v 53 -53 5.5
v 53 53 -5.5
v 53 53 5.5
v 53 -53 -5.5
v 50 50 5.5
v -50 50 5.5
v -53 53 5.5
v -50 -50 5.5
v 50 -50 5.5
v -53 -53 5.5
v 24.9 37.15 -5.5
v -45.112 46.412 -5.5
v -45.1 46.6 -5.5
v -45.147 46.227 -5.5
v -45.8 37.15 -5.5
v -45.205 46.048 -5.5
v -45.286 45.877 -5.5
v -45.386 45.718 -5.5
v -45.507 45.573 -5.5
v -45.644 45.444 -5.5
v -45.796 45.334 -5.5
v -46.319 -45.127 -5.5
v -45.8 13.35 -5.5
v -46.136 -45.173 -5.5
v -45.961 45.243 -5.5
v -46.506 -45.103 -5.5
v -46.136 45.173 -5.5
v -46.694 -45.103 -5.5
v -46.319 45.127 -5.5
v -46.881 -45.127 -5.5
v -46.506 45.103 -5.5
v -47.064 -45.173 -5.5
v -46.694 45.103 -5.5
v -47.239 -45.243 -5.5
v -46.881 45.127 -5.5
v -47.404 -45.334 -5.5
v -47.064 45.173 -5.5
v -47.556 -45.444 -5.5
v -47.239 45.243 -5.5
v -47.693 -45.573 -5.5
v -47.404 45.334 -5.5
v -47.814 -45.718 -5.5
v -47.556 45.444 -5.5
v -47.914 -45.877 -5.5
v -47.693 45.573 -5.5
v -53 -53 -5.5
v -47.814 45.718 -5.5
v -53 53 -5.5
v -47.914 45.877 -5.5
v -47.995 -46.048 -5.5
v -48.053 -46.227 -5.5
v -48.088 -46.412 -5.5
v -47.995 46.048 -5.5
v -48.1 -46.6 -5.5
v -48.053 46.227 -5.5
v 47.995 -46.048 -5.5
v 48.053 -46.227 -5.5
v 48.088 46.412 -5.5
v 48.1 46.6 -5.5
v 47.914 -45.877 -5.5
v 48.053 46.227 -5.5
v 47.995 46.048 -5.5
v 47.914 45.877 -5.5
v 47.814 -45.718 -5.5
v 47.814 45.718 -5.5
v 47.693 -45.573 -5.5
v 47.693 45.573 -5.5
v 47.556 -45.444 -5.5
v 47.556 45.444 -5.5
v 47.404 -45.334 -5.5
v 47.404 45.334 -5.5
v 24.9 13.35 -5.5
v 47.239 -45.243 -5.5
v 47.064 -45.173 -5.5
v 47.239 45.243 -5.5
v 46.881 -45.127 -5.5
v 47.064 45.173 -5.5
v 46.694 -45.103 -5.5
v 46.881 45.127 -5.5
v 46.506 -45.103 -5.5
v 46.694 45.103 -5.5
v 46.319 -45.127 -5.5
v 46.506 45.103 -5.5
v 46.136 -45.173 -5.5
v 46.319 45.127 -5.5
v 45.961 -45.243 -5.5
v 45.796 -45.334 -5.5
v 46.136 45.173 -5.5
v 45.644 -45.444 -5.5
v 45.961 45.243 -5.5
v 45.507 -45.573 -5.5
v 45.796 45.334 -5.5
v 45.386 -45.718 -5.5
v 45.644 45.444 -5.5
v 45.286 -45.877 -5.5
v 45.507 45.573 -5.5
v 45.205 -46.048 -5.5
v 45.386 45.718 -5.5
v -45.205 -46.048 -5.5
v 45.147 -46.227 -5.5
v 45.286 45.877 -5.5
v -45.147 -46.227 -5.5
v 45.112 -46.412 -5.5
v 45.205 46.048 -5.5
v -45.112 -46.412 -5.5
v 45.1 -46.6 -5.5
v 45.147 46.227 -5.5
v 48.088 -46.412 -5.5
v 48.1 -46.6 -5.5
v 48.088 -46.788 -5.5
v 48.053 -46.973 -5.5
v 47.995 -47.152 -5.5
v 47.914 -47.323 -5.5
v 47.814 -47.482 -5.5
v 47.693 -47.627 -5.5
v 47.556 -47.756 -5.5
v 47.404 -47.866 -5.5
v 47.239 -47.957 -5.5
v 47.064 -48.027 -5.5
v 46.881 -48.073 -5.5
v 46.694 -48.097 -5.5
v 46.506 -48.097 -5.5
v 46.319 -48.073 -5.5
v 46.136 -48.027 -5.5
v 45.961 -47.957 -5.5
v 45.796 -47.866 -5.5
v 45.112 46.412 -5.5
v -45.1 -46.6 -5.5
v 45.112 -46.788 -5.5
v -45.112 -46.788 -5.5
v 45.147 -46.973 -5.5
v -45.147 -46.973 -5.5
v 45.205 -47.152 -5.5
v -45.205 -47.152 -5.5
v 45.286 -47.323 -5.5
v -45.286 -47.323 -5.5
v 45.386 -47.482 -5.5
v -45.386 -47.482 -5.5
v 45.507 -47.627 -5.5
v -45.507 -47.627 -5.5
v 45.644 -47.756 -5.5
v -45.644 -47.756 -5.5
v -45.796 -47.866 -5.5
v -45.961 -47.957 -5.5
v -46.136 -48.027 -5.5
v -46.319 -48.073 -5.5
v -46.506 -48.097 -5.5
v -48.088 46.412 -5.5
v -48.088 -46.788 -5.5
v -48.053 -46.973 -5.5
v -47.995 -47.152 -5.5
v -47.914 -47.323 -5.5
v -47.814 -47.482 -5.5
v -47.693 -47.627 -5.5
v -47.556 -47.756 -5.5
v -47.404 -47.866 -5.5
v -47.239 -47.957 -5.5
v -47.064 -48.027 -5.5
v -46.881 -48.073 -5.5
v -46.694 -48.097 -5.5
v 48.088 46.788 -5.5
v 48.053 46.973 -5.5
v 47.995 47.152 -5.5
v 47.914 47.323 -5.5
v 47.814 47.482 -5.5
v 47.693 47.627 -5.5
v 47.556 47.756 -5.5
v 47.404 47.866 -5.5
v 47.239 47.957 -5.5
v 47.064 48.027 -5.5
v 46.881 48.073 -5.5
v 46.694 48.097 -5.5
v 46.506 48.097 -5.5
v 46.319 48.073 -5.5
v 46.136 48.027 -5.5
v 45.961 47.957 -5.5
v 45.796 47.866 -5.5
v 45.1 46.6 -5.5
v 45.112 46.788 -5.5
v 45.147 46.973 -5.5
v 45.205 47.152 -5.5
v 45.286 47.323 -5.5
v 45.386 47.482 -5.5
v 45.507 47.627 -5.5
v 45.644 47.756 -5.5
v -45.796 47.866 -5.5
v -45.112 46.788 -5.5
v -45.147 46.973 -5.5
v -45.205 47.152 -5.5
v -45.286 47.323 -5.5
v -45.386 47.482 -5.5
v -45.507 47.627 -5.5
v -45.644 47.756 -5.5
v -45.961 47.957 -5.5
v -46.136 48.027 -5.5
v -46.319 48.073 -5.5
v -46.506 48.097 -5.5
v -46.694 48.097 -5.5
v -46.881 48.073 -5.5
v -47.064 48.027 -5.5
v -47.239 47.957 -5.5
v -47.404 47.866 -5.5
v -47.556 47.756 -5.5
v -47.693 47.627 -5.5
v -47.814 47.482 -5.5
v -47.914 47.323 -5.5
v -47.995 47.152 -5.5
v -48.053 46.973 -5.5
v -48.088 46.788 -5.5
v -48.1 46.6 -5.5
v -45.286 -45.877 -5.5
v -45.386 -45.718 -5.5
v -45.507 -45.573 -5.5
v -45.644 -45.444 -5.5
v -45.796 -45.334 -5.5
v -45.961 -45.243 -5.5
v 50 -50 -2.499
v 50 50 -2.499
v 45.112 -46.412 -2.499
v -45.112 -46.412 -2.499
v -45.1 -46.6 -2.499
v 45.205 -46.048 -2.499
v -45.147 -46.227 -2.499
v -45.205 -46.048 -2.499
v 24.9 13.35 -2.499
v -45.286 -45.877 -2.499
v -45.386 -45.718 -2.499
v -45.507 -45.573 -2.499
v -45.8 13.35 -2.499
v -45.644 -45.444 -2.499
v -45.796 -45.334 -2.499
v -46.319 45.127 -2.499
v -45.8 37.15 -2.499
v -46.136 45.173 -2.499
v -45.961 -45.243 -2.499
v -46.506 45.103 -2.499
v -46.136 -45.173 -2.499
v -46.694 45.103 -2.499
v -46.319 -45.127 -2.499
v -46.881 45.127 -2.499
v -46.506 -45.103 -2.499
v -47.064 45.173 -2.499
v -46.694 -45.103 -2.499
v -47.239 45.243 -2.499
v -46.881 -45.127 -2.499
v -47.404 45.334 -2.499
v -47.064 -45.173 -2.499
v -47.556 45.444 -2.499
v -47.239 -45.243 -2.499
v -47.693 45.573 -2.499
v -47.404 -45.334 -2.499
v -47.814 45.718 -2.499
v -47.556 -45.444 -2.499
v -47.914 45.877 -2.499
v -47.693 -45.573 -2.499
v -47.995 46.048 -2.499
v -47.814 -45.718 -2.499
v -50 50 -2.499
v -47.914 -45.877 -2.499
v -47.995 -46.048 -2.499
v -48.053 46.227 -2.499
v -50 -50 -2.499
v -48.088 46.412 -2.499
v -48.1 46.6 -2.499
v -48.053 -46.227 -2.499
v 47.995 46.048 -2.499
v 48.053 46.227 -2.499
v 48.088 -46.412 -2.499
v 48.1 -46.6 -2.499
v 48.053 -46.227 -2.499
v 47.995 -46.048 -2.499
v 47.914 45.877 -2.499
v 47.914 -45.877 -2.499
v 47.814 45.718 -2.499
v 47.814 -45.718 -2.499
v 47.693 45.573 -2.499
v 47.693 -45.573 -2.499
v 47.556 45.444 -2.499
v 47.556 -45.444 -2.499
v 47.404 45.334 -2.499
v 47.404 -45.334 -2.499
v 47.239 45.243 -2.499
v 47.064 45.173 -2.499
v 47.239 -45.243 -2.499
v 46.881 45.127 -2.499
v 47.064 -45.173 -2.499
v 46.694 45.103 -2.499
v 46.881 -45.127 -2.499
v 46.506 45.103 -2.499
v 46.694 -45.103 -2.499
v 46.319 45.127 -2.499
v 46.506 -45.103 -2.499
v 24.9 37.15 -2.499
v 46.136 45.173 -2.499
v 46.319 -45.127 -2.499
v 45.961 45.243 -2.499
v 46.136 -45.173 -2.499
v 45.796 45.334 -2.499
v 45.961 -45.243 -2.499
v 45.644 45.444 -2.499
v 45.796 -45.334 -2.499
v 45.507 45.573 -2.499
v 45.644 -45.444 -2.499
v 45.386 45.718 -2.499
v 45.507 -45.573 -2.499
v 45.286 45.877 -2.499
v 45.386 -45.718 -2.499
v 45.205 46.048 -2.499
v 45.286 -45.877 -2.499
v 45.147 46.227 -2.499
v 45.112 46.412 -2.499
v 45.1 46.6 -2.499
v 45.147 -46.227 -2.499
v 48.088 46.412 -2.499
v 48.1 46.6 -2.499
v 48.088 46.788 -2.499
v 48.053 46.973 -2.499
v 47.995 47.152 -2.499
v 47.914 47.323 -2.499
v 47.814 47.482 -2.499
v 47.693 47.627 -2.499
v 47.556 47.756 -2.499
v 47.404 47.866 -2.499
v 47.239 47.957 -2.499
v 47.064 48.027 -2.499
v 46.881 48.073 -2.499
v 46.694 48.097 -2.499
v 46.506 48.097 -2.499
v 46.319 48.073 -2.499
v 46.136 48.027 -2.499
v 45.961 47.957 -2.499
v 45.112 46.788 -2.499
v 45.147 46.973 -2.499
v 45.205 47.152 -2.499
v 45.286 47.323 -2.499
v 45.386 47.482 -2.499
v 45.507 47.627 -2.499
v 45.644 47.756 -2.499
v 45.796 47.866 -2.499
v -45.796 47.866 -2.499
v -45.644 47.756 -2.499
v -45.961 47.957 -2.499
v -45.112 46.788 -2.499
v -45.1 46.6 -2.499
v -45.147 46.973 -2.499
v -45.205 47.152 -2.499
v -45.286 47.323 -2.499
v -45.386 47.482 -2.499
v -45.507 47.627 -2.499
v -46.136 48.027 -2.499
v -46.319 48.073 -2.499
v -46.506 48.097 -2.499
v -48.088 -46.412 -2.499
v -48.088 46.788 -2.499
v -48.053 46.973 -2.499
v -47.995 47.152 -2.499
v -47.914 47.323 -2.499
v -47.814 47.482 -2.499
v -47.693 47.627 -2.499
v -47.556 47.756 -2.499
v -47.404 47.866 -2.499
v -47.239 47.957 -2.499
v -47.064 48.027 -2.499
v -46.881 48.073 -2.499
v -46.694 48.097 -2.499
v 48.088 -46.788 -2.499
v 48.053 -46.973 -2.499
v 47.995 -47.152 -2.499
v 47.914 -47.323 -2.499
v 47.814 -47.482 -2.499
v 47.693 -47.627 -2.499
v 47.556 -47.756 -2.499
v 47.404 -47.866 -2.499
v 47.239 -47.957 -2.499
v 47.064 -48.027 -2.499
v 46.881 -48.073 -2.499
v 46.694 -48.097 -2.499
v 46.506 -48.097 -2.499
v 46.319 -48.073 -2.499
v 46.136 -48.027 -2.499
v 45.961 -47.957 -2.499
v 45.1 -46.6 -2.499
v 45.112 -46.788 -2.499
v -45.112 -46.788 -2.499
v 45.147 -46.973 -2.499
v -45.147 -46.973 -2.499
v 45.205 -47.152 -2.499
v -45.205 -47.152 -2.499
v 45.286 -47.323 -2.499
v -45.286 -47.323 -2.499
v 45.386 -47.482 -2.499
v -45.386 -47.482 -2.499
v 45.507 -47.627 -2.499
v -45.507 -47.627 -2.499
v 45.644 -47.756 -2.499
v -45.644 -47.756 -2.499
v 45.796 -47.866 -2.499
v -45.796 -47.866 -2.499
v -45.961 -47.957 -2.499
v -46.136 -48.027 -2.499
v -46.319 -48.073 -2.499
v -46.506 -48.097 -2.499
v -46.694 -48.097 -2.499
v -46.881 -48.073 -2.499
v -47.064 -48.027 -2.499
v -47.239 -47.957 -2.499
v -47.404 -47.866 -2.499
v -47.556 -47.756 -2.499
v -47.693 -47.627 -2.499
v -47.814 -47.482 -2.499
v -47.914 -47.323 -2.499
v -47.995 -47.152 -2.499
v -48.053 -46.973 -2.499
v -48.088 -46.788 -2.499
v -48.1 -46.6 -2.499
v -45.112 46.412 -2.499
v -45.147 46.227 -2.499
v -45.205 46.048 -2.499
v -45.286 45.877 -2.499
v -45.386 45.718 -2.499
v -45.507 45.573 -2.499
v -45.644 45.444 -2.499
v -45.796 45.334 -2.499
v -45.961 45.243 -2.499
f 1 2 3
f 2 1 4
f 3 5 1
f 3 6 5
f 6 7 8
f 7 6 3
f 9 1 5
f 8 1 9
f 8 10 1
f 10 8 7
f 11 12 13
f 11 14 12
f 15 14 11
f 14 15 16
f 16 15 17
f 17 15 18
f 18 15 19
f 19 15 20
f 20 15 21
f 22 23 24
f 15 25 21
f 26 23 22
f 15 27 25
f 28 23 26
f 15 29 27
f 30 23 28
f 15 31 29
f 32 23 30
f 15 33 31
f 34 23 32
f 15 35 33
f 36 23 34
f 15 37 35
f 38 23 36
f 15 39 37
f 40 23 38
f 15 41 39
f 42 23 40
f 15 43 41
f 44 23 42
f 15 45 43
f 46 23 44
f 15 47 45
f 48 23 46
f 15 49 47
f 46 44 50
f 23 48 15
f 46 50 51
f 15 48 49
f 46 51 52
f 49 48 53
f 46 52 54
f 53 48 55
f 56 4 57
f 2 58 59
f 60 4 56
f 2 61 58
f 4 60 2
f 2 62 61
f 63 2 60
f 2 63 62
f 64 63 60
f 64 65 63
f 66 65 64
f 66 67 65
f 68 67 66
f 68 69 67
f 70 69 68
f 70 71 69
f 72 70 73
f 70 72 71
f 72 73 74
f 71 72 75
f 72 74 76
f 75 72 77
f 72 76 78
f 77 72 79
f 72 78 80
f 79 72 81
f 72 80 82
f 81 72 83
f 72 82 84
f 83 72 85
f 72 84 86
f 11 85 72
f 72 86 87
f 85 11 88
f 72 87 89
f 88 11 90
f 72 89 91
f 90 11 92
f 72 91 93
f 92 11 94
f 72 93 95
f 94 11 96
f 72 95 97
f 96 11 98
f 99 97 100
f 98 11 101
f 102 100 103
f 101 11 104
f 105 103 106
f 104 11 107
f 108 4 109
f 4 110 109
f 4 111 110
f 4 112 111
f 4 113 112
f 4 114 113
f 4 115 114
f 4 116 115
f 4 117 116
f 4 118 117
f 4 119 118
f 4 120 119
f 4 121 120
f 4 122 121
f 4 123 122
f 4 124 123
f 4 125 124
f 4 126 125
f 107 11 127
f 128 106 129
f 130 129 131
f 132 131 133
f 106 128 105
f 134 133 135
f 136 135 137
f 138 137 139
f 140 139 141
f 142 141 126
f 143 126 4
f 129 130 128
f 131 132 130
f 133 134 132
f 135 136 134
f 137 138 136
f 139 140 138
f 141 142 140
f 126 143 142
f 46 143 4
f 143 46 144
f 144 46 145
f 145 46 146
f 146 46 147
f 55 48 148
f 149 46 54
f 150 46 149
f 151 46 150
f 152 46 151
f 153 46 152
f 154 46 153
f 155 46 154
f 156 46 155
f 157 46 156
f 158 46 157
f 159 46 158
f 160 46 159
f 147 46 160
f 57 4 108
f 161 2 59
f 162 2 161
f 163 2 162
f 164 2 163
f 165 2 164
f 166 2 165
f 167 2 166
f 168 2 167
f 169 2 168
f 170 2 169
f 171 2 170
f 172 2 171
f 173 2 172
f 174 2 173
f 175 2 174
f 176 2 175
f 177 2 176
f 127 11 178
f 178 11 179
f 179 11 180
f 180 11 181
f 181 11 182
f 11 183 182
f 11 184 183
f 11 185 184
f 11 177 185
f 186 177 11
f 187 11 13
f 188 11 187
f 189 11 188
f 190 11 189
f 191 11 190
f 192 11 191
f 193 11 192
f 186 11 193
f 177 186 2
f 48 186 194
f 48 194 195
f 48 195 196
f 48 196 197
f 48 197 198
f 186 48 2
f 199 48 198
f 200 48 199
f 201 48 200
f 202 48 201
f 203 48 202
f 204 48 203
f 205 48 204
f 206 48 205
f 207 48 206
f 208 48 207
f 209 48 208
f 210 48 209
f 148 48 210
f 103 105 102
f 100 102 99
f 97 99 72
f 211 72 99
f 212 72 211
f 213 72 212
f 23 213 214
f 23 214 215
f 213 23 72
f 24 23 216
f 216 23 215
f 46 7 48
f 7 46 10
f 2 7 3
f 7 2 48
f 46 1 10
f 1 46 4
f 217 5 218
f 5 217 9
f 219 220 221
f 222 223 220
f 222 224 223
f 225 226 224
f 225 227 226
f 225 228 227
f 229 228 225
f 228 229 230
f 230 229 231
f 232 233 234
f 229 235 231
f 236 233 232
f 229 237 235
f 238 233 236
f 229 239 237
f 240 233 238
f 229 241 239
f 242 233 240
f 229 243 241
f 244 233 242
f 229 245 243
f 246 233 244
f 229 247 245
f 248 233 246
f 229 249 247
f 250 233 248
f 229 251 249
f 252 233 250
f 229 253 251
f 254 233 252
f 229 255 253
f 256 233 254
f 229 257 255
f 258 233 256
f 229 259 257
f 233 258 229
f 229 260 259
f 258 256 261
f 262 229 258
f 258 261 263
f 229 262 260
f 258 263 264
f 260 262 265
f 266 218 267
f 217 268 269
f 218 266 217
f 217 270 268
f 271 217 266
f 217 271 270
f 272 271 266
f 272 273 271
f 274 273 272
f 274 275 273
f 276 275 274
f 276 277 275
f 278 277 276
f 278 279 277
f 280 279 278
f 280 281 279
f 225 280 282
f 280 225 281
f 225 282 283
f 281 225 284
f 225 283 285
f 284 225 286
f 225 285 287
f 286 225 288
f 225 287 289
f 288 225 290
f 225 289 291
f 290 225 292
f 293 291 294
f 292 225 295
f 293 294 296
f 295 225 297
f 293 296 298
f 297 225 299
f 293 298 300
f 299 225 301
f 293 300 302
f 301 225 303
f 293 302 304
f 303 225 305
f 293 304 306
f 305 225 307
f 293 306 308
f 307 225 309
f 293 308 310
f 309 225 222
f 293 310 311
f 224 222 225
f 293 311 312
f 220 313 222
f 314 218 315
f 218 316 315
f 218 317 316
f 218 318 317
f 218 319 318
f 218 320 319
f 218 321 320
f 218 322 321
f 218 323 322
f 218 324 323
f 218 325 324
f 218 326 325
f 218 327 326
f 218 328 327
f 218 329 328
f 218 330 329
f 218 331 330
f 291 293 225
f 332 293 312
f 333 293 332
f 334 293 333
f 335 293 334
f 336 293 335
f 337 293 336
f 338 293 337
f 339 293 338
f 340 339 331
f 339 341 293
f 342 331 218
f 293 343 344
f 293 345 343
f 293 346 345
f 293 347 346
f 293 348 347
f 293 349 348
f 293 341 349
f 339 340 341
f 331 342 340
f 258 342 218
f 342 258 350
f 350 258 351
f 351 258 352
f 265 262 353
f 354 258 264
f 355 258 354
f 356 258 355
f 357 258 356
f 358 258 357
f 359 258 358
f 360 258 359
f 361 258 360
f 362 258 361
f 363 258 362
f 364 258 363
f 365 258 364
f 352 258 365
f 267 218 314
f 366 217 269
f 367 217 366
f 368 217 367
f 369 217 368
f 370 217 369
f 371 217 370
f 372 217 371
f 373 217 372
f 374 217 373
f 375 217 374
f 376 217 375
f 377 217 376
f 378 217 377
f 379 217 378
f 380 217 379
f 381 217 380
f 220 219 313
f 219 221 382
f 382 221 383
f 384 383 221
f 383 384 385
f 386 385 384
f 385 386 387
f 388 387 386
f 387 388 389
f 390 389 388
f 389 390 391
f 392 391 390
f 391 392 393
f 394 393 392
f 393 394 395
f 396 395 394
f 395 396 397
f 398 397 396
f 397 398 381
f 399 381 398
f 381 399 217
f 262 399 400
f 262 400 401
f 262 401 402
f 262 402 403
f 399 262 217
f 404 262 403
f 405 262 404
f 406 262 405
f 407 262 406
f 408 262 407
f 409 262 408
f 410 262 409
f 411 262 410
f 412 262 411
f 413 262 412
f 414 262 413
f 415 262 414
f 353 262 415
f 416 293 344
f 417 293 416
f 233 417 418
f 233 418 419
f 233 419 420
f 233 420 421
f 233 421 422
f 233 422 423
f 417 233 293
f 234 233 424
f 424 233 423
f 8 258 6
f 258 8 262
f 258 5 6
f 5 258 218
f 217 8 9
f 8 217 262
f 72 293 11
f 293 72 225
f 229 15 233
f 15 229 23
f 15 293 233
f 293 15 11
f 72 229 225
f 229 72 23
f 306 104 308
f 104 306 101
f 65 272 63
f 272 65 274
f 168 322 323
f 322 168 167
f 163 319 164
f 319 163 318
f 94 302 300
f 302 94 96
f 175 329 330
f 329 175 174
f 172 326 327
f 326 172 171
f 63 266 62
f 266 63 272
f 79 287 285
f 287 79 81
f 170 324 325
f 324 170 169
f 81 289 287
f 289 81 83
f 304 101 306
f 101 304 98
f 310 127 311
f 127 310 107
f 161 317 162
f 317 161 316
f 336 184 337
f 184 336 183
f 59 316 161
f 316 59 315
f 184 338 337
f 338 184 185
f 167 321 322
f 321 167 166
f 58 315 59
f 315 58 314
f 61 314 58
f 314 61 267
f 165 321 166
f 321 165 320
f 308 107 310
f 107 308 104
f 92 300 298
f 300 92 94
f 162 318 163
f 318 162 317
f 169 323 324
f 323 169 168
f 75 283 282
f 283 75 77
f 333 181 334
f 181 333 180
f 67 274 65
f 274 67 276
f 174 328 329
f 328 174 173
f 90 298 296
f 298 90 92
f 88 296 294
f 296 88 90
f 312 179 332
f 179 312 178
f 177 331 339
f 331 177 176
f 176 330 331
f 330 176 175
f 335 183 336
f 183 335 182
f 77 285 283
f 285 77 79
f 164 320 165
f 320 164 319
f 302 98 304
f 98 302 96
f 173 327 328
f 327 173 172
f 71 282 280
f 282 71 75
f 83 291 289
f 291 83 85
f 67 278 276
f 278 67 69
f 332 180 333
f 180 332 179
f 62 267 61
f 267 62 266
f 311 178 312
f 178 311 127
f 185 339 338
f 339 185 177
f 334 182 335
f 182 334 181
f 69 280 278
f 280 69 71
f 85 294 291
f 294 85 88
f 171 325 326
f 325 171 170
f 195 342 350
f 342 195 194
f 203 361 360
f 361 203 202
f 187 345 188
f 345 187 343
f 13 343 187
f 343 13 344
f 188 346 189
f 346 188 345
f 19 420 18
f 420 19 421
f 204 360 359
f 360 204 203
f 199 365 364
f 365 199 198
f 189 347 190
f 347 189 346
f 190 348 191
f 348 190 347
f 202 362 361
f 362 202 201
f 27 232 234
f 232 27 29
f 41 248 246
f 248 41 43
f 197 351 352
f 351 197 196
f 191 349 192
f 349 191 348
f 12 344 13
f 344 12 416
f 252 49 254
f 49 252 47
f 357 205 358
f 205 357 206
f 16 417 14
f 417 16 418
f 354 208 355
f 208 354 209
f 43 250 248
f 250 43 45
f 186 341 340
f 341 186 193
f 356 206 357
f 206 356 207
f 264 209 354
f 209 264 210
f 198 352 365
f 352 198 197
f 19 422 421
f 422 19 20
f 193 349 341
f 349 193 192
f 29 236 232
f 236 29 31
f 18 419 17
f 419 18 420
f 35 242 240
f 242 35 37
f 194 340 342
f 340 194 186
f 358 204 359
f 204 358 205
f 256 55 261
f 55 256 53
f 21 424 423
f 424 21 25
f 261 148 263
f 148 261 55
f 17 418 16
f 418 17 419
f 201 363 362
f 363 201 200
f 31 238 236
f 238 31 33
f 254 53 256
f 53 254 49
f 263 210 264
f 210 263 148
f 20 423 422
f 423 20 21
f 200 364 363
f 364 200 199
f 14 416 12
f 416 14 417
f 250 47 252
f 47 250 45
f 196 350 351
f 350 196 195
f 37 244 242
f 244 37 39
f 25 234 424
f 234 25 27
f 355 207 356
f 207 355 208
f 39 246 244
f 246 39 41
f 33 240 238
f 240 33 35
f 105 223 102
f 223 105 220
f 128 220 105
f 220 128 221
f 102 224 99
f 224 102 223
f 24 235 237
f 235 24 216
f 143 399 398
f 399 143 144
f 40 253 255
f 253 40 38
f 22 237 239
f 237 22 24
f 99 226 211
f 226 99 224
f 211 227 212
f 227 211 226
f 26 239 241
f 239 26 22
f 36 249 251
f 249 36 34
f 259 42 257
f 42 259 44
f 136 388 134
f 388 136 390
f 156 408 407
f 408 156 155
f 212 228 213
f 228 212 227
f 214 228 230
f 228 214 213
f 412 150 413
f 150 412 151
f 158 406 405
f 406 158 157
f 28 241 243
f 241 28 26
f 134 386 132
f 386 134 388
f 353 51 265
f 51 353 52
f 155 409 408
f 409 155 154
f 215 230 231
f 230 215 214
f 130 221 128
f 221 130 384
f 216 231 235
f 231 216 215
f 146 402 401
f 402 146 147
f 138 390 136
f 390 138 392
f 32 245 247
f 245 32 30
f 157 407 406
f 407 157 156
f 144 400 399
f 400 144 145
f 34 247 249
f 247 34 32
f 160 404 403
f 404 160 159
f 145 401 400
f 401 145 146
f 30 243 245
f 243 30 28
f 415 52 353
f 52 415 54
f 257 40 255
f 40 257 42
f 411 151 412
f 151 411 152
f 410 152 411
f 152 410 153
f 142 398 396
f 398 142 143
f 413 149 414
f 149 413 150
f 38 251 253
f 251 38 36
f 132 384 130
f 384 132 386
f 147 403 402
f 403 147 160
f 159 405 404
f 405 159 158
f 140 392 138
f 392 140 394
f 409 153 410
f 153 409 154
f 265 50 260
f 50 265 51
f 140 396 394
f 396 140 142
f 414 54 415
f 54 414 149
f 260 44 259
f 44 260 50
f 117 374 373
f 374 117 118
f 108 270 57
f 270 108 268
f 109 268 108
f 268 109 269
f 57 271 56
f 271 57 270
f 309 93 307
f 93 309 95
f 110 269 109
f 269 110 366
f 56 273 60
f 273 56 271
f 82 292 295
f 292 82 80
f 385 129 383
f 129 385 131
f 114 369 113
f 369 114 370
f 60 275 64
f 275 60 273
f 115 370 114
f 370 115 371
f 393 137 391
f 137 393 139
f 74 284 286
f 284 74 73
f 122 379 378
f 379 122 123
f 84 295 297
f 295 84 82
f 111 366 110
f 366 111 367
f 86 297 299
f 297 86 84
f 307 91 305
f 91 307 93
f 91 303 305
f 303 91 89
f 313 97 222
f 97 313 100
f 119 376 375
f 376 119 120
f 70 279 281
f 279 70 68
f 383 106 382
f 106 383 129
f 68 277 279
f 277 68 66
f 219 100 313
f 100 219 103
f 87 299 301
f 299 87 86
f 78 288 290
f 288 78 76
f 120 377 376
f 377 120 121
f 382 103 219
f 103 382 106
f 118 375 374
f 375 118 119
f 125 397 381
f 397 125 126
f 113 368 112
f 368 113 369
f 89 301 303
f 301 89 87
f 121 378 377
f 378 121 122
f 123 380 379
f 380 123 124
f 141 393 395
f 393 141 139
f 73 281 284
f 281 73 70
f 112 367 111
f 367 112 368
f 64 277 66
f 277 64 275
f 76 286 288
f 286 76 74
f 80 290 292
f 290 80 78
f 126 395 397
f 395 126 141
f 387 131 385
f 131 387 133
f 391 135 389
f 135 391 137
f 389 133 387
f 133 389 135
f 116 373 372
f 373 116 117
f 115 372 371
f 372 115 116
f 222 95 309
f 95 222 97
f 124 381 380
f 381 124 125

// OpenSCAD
$fn = 50;

bottom();

//The bottom part (with LCD screen)
module bottom(bLength = 106, bWidth = 106, bHeight = 11, bWalls = 3, DiamScrew = 3){
    difference(){
        cube([bLength, bWidth, bHeight], center = true);
        translate([0,0,1.501]){
            cube([bLength-2*bWalls, bWidth-2*bWalls, bHeight-bWalls], center = true);
        }
        
        //hole for the screen
        screen_L = 70.7;
        screen_W = 23.8;
        X_POS = screen_L/2+4.2;
        Y_POS = screen_W/2+12.85;
        translate([-bLength/2+bWalls+X_POS,bWidth/2-bWalls-Y_POS,-3]) cube([screen_L, screen_W, 2*bWalls],center = true);
        //holes for the screw
        OFFSET = 3.4;
        translate([(bLength-2*bWalls)/2-OFFSET,(bWidth-2*bWalls)/2-OFFSET,-bWalls])Screwhole(DiamScrew, bWalls);
        translate([-(bLength-2*bWalls)/2+OFFSET,(bWidth-2*bWalls)/2-OFFSET,-bWalls])Screwhole(DiamScrew, bWalls);
        translate([-(bLength-2*bWalls)/2+OFFSET,-(bWidth-2*bWalls)/2+OFFSET,-bWalls])Screwhole(DiamScrew, bWalls);
        translate([(bLength-2*bWalls)/2-OFFSET,-(bWidth-2*bWalls)/2+OFFSET,-bWalls])Screwhole(DiamScrew, bWalls);
    }
        
}

module Screwhole(DiamScrew = 3, bWalls = 3){
    cylinder(d=DiamScrew, h=2*bWalls, center = true);
}
